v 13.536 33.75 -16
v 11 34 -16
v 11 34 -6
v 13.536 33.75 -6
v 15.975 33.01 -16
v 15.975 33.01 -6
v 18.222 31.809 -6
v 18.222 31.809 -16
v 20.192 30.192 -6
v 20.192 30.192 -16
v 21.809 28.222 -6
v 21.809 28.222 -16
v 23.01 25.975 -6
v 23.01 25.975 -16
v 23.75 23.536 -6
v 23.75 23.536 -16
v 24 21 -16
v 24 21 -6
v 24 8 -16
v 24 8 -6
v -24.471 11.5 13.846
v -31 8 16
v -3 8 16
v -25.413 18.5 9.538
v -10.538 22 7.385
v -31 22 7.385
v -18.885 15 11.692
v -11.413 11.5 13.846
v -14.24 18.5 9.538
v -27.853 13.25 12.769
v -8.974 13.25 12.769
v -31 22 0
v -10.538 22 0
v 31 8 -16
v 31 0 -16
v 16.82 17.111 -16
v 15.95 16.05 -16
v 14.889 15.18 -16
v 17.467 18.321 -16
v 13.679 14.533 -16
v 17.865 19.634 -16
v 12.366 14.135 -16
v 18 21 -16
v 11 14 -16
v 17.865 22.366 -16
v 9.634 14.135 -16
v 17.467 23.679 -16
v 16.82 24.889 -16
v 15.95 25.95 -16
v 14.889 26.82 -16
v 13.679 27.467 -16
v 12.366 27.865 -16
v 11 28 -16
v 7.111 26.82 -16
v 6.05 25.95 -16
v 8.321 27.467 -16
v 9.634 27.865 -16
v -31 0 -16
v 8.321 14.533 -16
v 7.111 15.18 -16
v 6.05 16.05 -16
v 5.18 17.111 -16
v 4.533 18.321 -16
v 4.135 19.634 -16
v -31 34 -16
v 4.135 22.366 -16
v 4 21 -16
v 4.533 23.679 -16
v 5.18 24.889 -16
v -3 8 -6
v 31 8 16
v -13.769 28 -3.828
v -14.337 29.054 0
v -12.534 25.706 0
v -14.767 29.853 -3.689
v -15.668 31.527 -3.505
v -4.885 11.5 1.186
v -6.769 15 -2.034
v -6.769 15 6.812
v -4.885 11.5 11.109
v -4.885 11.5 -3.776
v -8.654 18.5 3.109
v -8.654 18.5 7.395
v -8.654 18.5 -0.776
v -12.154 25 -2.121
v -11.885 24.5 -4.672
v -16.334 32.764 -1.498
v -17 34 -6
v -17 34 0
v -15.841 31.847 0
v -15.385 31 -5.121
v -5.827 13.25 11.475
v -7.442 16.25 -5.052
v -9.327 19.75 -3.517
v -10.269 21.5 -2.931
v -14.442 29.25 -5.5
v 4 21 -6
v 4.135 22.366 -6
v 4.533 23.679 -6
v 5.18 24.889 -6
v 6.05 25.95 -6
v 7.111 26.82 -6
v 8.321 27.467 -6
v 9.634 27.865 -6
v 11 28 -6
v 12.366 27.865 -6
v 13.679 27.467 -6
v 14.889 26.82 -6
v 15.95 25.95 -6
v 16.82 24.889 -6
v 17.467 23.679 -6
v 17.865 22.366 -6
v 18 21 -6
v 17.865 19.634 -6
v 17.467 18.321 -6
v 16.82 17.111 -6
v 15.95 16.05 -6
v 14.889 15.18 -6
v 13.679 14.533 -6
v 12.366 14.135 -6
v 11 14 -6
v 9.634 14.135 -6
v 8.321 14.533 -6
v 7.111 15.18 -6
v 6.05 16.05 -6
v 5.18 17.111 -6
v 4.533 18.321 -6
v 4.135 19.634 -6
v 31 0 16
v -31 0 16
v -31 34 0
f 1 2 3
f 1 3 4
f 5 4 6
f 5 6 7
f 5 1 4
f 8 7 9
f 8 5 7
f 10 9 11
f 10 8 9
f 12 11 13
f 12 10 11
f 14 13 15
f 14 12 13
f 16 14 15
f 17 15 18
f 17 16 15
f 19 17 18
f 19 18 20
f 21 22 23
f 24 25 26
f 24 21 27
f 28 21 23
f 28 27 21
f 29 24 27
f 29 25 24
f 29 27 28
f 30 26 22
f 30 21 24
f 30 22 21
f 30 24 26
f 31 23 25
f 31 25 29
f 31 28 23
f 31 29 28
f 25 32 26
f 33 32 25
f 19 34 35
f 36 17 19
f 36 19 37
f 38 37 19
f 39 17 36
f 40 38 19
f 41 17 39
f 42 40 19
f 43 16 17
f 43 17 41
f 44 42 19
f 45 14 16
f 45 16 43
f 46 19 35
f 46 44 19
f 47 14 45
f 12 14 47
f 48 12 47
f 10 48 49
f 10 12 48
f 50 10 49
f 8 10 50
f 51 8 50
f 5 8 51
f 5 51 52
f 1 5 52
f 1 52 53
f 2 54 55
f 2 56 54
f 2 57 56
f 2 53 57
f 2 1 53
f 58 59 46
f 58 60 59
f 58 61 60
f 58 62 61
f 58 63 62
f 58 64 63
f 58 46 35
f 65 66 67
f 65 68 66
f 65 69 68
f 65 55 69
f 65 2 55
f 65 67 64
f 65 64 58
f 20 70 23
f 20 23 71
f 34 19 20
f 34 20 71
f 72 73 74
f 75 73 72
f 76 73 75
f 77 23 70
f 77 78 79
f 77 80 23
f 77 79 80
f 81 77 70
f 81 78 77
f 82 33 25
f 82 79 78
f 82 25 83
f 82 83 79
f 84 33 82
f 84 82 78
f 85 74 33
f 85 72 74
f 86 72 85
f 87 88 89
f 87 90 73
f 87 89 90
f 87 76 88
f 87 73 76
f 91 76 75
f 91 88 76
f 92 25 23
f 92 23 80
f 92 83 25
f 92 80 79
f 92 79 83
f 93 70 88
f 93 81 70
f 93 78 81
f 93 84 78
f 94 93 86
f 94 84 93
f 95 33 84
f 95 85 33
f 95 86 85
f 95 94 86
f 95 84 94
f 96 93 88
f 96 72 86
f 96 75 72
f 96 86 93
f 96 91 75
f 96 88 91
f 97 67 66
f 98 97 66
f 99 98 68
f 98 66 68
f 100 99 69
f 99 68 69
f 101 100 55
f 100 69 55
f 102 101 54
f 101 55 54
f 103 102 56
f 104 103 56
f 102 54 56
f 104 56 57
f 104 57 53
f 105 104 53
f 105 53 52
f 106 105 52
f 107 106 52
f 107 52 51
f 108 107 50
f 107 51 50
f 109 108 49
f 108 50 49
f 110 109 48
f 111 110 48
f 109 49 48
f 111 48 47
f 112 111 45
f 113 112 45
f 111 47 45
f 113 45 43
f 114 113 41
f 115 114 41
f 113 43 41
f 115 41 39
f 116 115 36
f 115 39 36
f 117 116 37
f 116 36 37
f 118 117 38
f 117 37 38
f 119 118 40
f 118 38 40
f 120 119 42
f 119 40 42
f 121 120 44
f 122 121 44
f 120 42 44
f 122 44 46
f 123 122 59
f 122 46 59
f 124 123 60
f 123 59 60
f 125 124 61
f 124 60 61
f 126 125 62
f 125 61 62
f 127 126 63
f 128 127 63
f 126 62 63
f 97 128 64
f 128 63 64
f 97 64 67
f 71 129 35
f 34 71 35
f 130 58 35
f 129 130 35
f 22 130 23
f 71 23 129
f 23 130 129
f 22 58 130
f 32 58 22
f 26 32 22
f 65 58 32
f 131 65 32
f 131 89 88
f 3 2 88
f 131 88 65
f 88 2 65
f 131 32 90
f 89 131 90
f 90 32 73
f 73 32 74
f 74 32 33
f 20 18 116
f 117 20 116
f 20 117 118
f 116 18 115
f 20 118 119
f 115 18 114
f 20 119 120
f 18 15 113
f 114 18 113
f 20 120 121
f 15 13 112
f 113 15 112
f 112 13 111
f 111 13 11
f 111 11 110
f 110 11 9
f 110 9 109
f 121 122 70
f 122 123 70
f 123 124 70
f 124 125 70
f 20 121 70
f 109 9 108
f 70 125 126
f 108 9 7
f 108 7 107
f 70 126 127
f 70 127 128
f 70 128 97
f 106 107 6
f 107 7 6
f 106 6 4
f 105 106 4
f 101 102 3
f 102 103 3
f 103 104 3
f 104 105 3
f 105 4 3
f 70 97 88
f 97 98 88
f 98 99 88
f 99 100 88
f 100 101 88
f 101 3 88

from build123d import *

# Parameters (mm, degrees)
SKETCH_1_W          = 62
SKETCH_1_H          = 32
EXTRUDE_1_DEPTH     = 8
SKETCH_2_R          = 7
EXTRUDE_2_DEPTH     = 10
SKETCH_6_W          = 21.388804526
SKETCH_6_H          = 8.444348029
CUT_EXTRUDE_1_DEPTH = 42.243181422


with BuildPart() as part:
    # 草图1 → 凸台-拉伸1 (new body)
    with BuildSketch(Plane(origin=(0, 0, 0), x_dir=(1, 0, 0), z_dir=(0, 1, 0))):
        Rectangle(SKETCH_1_W, SKETCH_1_H)
    extrude(amount=EXTRUDE_1_DEPTH)

    # 草图2 → 凸台-拉伸2 (add)
    with BuildSketch(Plane(origin=(0, 0, -16), x_dir=(-1, 0, 0), z_dir=(0, 0, -1))):
        with BuildLine():
            Line((-24, 21), (-24, 8))
            Line((-24, 8), (31, 8))
            Line((31, 8), (31, 34))
            Line((31, 34), (-11, 34))
            ThreePointArc((-11, 34), (-20.192388155, 30.192388155), (-24, 21))
        make_face()
        with Locations((-11, 21)):
            Circle(SKETCH_2_R, mode=Mode.SUBTRACT)
    extrude(amount=-EXTRUDE_2_DEPTH)

    # 草图5 → 放样1 section 0
    with BuildSketch(Plane(origin=(0, 8, 0), x_dir=(1, 0, 0), z_dir=(0, 1, 0))):
        with BuildLine():
            Line((-3, -16), (-3, 6))
            Line((-3, 6), (-31, 6))
            Line((-31, 6), (-31, -16))
            Line((-31, -16), (-3, -16))
        make_face()
    # 草图4 → 放样1 section 1
    with BuildSketch(Plane(origin=(0, 34, 0), x_dir=(1, 0, 0), z_dir=(0, 1, 0))):
        with BuildLine():
            Line((-31, 6), (-31, 0))
            Line((-31, 0), (-17, 0))
            Line((-17, 0), (-17, 6))
            Line((-17, 6), (-31, 6))
        make_face()
    loft()

    # 草图6 → 切除-拉伸1 (cut, through all)
    with BuildSketch(Plane(origin=(0, 22, 0), x_dir=(1, 0, 0), z_dir=(0, 1, 0))):
        with Locations((-20.305597737, -4.222174015)):
            Rectangle(SKETCH_6_W, SKETCH_6_H)
    extrude(amount=CUT_EXTRUDE_1_DEPTH, mode=Mode.SUBTRACT)


solid = part.part
